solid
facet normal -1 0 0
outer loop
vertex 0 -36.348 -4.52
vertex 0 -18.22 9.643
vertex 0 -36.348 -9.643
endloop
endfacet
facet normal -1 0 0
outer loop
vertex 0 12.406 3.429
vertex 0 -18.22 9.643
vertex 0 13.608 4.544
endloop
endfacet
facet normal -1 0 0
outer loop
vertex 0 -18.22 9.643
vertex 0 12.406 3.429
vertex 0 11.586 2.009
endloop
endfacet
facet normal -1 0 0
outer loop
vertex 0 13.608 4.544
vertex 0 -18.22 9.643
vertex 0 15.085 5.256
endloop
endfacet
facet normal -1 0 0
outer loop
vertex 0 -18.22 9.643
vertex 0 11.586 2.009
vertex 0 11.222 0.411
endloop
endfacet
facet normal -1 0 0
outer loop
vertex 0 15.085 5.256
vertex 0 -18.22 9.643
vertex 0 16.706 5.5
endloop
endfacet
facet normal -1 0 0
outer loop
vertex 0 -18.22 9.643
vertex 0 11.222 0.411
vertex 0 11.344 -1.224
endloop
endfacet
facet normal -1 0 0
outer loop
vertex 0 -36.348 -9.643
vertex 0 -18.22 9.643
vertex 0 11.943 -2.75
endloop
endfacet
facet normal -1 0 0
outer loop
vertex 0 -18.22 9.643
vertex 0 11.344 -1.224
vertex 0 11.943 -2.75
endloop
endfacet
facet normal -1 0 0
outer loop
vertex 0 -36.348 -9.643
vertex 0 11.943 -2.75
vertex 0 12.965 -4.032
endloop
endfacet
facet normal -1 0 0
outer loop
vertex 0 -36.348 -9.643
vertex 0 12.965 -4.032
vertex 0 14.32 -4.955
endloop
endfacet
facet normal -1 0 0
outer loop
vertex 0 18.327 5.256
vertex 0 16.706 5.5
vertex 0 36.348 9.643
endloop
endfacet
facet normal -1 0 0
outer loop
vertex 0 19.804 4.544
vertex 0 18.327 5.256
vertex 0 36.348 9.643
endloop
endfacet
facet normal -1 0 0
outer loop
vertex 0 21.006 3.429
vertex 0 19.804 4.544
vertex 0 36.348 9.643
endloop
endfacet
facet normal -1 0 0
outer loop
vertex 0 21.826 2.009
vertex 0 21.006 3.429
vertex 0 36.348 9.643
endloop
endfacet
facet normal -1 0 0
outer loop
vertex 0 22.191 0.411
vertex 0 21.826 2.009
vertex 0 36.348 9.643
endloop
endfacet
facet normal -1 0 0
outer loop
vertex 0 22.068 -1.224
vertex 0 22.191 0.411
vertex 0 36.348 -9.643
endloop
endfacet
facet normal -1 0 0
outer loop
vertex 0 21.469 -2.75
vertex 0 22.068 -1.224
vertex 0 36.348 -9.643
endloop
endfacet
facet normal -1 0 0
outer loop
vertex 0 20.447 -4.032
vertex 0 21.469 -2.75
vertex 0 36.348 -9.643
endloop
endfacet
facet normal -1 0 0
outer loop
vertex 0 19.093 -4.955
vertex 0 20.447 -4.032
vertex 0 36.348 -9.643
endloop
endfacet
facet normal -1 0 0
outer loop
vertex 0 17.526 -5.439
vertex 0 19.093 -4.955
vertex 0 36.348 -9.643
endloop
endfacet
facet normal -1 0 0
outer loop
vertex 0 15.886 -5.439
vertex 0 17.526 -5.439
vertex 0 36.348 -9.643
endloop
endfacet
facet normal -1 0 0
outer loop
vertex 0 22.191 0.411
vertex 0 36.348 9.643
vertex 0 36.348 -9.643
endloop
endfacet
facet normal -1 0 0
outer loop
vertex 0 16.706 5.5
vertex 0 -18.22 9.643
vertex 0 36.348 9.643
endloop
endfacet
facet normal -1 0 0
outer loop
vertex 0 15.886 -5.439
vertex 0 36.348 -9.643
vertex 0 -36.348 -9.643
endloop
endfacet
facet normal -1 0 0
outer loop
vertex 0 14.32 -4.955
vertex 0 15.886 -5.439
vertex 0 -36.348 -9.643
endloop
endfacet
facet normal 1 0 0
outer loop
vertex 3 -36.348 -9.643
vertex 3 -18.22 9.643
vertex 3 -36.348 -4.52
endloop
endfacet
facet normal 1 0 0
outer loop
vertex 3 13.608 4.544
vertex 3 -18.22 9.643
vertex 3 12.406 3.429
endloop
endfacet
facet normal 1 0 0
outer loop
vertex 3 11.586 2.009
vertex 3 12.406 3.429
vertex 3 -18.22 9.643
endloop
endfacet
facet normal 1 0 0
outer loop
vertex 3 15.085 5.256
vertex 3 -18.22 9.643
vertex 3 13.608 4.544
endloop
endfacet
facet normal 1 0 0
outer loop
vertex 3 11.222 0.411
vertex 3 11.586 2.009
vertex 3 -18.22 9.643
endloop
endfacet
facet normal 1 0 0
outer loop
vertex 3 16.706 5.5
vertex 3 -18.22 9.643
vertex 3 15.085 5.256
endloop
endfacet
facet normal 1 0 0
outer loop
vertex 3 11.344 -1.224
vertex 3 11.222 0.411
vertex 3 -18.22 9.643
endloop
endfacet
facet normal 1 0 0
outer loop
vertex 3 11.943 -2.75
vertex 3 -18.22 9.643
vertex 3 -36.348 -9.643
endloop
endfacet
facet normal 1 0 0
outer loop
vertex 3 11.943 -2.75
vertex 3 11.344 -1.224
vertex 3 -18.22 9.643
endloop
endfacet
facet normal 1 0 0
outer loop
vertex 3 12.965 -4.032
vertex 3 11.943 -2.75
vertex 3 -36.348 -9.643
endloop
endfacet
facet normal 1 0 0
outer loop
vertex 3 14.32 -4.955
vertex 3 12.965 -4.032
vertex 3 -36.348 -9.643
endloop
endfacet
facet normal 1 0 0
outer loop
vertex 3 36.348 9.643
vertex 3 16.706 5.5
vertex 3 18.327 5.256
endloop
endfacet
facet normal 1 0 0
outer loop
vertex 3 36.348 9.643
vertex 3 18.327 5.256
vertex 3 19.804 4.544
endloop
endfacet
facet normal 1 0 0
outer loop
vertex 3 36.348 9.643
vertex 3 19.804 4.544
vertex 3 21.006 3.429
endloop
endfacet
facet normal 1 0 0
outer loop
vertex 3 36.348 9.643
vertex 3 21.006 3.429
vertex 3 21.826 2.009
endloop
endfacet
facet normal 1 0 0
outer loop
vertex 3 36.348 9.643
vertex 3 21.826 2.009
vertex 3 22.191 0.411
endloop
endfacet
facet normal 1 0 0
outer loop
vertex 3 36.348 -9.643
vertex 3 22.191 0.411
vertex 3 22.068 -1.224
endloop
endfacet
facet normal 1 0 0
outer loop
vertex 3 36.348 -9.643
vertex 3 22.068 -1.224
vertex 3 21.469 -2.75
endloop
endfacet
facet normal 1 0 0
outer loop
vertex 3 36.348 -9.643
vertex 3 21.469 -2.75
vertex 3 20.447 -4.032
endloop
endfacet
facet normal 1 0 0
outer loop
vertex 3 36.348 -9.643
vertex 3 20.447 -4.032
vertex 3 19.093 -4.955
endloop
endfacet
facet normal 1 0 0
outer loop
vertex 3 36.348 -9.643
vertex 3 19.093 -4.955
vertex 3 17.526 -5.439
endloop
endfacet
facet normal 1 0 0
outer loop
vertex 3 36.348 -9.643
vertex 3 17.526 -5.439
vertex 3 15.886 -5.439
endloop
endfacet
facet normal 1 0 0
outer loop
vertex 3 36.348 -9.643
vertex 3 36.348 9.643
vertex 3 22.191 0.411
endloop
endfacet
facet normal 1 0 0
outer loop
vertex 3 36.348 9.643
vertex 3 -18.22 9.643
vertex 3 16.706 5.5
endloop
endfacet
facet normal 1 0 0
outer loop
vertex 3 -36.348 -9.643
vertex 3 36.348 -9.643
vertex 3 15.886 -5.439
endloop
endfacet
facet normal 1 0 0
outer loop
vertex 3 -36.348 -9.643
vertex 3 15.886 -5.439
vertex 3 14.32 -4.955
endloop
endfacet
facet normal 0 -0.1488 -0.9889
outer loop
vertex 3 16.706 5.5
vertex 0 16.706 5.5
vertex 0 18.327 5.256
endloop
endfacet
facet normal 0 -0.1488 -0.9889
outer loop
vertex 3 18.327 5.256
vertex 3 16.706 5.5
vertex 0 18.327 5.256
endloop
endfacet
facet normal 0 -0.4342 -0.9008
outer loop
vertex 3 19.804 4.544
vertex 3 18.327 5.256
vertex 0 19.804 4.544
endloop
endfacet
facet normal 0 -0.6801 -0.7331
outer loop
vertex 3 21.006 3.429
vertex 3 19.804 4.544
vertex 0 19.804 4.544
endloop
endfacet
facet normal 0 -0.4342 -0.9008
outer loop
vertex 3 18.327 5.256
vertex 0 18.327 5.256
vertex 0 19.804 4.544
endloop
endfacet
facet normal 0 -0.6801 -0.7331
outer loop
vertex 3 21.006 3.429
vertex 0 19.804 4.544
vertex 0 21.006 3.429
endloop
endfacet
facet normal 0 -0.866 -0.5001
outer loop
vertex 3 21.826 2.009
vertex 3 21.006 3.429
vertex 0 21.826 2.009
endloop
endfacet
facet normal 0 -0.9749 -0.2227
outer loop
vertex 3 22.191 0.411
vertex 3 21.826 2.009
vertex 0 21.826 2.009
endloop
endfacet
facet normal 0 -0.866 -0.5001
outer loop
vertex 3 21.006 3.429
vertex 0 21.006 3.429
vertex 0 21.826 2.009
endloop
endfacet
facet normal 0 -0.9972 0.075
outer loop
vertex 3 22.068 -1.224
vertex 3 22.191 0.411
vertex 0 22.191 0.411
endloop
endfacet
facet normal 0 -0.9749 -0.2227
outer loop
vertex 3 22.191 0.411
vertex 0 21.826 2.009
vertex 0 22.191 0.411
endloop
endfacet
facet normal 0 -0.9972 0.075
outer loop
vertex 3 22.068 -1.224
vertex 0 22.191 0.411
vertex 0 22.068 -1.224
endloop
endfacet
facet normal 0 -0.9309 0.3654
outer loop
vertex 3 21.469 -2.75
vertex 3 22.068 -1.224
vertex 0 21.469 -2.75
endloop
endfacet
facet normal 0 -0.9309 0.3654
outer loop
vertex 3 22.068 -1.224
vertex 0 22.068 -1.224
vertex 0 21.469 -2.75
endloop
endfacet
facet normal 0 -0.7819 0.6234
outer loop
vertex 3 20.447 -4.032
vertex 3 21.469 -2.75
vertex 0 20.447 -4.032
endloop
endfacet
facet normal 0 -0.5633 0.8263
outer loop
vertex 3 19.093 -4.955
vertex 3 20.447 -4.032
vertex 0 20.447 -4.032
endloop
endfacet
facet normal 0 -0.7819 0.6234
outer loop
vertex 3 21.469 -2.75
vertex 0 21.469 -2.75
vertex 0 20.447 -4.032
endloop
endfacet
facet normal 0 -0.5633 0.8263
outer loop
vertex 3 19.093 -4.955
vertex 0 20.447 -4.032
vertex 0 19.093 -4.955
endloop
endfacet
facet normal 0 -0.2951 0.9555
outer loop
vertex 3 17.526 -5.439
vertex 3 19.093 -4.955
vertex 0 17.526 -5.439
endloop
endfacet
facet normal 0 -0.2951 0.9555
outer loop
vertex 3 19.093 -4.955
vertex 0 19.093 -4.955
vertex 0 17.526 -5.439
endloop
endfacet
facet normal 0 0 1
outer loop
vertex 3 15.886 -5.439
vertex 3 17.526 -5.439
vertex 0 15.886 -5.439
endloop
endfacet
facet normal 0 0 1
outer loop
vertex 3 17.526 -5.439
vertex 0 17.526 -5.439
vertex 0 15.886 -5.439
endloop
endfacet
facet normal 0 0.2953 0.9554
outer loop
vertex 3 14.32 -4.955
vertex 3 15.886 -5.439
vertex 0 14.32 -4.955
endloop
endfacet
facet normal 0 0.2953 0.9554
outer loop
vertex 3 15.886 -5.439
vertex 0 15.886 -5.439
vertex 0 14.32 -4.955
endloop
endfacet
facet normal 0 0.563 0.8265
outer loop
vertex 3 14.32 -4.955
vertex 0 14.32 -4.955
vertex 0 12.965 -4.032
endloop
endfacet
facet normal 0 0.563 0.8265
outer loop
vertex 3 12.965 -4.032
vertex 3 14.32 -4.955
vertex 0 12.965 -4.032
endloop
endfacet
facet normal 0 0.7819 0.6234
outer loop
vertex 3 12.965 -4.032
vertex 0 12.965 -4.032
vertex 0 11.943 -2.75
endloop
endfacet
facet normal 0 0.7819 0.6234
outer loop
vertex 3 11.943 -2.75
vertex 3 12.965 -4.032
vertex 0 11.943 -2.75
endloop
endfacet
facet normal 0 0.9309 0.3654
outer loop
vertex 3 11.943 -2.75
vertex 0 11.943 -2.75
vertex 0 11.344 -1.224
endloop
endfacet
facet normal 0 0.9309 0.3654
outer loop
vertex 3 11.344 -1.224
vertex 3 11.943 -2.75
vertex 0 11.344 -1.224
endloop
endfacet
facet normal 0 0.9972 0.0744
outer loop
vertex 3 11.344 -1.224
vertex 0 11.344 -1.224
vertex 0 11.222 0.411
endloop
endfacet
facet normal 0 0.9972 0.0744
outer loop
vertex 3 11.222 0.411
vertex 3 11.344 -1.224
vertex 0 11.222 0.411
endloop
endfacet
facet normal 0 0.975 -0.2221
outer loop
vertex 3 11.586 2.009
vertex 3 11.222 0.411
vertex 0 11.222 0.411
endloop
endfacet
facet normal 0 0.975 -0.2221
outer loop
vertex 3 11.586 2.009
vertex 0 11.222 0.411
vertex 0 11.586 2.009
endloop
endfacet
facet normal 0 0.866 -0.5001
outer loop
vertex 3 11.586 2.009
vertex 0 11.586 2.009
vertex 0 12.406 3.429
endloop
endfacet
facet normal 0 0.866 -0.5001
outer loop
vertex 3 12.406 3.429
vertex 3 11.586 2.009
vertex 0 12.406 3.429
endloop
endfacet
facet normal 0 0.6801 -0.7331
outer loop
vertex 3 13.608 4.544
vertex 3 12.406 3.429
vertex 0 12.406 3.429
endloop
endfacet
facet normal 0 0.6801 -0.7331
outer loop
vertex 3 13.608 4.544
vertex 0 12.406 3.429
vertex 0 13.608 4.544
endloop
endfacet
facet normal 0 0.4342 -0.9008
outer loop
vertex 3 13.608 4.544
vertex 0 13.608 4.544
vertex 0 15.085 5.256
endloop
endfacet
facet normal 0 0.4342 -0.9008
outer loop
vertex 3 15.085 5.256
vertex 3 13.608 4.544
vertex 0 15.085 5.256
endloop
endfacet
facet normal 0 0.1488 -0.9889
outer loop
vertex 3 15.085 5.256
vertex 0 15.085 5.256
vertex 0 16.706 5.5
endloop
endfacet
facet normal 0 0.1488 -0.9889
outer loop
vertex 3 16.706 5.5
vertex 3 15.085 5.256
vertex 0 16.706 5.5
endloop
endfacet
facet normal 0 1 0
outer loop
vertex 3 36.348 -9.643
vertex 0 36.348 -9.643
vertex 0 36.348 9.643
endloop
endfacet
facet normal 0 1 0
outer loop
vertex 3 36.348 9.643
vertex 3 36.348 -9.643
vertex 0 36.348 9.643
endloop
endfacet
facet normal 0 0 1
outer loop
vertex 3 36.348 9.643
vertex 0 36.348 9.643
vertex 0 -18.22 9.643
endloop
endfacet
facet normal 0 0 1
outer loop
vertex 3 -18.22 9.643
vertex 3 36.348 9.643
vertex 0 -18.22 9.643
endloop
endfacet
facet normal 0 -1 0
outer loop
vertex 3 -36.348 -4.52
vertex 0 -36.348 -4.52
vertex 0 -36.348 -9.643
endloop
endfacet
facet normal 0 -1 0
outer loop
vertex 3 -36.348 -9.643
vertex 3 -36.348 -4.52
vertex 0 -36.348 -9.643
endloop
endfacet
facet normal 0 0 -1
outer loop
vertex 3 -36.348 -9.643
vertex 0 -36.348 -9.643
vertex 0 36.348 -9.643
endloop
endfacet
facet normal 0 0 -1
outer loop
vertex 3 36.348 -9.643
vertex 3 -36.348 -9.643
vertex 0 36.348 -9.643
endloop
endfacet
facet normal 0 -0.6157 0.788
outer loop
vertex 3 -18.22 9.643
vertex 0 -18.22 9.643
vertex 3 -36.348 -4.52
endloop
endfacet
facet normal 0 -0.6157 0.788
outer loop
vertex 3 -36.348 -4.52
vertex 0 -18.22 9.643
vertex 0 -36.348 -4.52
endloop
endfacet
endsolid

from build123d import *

# Parameters (mm, degrees)
EXTRUDE_1_DEPTH     = 3
SKETCH_2_R          = 5.5
CUT_EXTRUDE_1_DEPTH = 38.72513216


with BuildPart() as part:
    # Эскиз1 → Бобышка-Вытянуть1 (new body)
    with BuildSketch(Plane(origin=(0, 0, 0), x_dir=(0, 0, -1), z_dir=(1, 0, 0))):
        Polygon((9.642962643, 36.348299382), (-9.642962643, 36.348299382), (-9.642962643, -18.220164561), (4.520288528, -36.348299382), (9.642962643, -36.348299382), align=None)
    extrude(amount=EXTRUDE_1_DEPTH)

    # Эскиз2 → Вырез-Вытянуть1 (cut, through all)
    with BuildSketch(Plane.ZY):
        with Locations((0, 16.706183396)):
            Circle(SKETCH_2_R)
    extrude(amount=-CUT_EXTRUDE_1_DEPTH, mode=Mode.SUBTRACT)


solid = part.part
